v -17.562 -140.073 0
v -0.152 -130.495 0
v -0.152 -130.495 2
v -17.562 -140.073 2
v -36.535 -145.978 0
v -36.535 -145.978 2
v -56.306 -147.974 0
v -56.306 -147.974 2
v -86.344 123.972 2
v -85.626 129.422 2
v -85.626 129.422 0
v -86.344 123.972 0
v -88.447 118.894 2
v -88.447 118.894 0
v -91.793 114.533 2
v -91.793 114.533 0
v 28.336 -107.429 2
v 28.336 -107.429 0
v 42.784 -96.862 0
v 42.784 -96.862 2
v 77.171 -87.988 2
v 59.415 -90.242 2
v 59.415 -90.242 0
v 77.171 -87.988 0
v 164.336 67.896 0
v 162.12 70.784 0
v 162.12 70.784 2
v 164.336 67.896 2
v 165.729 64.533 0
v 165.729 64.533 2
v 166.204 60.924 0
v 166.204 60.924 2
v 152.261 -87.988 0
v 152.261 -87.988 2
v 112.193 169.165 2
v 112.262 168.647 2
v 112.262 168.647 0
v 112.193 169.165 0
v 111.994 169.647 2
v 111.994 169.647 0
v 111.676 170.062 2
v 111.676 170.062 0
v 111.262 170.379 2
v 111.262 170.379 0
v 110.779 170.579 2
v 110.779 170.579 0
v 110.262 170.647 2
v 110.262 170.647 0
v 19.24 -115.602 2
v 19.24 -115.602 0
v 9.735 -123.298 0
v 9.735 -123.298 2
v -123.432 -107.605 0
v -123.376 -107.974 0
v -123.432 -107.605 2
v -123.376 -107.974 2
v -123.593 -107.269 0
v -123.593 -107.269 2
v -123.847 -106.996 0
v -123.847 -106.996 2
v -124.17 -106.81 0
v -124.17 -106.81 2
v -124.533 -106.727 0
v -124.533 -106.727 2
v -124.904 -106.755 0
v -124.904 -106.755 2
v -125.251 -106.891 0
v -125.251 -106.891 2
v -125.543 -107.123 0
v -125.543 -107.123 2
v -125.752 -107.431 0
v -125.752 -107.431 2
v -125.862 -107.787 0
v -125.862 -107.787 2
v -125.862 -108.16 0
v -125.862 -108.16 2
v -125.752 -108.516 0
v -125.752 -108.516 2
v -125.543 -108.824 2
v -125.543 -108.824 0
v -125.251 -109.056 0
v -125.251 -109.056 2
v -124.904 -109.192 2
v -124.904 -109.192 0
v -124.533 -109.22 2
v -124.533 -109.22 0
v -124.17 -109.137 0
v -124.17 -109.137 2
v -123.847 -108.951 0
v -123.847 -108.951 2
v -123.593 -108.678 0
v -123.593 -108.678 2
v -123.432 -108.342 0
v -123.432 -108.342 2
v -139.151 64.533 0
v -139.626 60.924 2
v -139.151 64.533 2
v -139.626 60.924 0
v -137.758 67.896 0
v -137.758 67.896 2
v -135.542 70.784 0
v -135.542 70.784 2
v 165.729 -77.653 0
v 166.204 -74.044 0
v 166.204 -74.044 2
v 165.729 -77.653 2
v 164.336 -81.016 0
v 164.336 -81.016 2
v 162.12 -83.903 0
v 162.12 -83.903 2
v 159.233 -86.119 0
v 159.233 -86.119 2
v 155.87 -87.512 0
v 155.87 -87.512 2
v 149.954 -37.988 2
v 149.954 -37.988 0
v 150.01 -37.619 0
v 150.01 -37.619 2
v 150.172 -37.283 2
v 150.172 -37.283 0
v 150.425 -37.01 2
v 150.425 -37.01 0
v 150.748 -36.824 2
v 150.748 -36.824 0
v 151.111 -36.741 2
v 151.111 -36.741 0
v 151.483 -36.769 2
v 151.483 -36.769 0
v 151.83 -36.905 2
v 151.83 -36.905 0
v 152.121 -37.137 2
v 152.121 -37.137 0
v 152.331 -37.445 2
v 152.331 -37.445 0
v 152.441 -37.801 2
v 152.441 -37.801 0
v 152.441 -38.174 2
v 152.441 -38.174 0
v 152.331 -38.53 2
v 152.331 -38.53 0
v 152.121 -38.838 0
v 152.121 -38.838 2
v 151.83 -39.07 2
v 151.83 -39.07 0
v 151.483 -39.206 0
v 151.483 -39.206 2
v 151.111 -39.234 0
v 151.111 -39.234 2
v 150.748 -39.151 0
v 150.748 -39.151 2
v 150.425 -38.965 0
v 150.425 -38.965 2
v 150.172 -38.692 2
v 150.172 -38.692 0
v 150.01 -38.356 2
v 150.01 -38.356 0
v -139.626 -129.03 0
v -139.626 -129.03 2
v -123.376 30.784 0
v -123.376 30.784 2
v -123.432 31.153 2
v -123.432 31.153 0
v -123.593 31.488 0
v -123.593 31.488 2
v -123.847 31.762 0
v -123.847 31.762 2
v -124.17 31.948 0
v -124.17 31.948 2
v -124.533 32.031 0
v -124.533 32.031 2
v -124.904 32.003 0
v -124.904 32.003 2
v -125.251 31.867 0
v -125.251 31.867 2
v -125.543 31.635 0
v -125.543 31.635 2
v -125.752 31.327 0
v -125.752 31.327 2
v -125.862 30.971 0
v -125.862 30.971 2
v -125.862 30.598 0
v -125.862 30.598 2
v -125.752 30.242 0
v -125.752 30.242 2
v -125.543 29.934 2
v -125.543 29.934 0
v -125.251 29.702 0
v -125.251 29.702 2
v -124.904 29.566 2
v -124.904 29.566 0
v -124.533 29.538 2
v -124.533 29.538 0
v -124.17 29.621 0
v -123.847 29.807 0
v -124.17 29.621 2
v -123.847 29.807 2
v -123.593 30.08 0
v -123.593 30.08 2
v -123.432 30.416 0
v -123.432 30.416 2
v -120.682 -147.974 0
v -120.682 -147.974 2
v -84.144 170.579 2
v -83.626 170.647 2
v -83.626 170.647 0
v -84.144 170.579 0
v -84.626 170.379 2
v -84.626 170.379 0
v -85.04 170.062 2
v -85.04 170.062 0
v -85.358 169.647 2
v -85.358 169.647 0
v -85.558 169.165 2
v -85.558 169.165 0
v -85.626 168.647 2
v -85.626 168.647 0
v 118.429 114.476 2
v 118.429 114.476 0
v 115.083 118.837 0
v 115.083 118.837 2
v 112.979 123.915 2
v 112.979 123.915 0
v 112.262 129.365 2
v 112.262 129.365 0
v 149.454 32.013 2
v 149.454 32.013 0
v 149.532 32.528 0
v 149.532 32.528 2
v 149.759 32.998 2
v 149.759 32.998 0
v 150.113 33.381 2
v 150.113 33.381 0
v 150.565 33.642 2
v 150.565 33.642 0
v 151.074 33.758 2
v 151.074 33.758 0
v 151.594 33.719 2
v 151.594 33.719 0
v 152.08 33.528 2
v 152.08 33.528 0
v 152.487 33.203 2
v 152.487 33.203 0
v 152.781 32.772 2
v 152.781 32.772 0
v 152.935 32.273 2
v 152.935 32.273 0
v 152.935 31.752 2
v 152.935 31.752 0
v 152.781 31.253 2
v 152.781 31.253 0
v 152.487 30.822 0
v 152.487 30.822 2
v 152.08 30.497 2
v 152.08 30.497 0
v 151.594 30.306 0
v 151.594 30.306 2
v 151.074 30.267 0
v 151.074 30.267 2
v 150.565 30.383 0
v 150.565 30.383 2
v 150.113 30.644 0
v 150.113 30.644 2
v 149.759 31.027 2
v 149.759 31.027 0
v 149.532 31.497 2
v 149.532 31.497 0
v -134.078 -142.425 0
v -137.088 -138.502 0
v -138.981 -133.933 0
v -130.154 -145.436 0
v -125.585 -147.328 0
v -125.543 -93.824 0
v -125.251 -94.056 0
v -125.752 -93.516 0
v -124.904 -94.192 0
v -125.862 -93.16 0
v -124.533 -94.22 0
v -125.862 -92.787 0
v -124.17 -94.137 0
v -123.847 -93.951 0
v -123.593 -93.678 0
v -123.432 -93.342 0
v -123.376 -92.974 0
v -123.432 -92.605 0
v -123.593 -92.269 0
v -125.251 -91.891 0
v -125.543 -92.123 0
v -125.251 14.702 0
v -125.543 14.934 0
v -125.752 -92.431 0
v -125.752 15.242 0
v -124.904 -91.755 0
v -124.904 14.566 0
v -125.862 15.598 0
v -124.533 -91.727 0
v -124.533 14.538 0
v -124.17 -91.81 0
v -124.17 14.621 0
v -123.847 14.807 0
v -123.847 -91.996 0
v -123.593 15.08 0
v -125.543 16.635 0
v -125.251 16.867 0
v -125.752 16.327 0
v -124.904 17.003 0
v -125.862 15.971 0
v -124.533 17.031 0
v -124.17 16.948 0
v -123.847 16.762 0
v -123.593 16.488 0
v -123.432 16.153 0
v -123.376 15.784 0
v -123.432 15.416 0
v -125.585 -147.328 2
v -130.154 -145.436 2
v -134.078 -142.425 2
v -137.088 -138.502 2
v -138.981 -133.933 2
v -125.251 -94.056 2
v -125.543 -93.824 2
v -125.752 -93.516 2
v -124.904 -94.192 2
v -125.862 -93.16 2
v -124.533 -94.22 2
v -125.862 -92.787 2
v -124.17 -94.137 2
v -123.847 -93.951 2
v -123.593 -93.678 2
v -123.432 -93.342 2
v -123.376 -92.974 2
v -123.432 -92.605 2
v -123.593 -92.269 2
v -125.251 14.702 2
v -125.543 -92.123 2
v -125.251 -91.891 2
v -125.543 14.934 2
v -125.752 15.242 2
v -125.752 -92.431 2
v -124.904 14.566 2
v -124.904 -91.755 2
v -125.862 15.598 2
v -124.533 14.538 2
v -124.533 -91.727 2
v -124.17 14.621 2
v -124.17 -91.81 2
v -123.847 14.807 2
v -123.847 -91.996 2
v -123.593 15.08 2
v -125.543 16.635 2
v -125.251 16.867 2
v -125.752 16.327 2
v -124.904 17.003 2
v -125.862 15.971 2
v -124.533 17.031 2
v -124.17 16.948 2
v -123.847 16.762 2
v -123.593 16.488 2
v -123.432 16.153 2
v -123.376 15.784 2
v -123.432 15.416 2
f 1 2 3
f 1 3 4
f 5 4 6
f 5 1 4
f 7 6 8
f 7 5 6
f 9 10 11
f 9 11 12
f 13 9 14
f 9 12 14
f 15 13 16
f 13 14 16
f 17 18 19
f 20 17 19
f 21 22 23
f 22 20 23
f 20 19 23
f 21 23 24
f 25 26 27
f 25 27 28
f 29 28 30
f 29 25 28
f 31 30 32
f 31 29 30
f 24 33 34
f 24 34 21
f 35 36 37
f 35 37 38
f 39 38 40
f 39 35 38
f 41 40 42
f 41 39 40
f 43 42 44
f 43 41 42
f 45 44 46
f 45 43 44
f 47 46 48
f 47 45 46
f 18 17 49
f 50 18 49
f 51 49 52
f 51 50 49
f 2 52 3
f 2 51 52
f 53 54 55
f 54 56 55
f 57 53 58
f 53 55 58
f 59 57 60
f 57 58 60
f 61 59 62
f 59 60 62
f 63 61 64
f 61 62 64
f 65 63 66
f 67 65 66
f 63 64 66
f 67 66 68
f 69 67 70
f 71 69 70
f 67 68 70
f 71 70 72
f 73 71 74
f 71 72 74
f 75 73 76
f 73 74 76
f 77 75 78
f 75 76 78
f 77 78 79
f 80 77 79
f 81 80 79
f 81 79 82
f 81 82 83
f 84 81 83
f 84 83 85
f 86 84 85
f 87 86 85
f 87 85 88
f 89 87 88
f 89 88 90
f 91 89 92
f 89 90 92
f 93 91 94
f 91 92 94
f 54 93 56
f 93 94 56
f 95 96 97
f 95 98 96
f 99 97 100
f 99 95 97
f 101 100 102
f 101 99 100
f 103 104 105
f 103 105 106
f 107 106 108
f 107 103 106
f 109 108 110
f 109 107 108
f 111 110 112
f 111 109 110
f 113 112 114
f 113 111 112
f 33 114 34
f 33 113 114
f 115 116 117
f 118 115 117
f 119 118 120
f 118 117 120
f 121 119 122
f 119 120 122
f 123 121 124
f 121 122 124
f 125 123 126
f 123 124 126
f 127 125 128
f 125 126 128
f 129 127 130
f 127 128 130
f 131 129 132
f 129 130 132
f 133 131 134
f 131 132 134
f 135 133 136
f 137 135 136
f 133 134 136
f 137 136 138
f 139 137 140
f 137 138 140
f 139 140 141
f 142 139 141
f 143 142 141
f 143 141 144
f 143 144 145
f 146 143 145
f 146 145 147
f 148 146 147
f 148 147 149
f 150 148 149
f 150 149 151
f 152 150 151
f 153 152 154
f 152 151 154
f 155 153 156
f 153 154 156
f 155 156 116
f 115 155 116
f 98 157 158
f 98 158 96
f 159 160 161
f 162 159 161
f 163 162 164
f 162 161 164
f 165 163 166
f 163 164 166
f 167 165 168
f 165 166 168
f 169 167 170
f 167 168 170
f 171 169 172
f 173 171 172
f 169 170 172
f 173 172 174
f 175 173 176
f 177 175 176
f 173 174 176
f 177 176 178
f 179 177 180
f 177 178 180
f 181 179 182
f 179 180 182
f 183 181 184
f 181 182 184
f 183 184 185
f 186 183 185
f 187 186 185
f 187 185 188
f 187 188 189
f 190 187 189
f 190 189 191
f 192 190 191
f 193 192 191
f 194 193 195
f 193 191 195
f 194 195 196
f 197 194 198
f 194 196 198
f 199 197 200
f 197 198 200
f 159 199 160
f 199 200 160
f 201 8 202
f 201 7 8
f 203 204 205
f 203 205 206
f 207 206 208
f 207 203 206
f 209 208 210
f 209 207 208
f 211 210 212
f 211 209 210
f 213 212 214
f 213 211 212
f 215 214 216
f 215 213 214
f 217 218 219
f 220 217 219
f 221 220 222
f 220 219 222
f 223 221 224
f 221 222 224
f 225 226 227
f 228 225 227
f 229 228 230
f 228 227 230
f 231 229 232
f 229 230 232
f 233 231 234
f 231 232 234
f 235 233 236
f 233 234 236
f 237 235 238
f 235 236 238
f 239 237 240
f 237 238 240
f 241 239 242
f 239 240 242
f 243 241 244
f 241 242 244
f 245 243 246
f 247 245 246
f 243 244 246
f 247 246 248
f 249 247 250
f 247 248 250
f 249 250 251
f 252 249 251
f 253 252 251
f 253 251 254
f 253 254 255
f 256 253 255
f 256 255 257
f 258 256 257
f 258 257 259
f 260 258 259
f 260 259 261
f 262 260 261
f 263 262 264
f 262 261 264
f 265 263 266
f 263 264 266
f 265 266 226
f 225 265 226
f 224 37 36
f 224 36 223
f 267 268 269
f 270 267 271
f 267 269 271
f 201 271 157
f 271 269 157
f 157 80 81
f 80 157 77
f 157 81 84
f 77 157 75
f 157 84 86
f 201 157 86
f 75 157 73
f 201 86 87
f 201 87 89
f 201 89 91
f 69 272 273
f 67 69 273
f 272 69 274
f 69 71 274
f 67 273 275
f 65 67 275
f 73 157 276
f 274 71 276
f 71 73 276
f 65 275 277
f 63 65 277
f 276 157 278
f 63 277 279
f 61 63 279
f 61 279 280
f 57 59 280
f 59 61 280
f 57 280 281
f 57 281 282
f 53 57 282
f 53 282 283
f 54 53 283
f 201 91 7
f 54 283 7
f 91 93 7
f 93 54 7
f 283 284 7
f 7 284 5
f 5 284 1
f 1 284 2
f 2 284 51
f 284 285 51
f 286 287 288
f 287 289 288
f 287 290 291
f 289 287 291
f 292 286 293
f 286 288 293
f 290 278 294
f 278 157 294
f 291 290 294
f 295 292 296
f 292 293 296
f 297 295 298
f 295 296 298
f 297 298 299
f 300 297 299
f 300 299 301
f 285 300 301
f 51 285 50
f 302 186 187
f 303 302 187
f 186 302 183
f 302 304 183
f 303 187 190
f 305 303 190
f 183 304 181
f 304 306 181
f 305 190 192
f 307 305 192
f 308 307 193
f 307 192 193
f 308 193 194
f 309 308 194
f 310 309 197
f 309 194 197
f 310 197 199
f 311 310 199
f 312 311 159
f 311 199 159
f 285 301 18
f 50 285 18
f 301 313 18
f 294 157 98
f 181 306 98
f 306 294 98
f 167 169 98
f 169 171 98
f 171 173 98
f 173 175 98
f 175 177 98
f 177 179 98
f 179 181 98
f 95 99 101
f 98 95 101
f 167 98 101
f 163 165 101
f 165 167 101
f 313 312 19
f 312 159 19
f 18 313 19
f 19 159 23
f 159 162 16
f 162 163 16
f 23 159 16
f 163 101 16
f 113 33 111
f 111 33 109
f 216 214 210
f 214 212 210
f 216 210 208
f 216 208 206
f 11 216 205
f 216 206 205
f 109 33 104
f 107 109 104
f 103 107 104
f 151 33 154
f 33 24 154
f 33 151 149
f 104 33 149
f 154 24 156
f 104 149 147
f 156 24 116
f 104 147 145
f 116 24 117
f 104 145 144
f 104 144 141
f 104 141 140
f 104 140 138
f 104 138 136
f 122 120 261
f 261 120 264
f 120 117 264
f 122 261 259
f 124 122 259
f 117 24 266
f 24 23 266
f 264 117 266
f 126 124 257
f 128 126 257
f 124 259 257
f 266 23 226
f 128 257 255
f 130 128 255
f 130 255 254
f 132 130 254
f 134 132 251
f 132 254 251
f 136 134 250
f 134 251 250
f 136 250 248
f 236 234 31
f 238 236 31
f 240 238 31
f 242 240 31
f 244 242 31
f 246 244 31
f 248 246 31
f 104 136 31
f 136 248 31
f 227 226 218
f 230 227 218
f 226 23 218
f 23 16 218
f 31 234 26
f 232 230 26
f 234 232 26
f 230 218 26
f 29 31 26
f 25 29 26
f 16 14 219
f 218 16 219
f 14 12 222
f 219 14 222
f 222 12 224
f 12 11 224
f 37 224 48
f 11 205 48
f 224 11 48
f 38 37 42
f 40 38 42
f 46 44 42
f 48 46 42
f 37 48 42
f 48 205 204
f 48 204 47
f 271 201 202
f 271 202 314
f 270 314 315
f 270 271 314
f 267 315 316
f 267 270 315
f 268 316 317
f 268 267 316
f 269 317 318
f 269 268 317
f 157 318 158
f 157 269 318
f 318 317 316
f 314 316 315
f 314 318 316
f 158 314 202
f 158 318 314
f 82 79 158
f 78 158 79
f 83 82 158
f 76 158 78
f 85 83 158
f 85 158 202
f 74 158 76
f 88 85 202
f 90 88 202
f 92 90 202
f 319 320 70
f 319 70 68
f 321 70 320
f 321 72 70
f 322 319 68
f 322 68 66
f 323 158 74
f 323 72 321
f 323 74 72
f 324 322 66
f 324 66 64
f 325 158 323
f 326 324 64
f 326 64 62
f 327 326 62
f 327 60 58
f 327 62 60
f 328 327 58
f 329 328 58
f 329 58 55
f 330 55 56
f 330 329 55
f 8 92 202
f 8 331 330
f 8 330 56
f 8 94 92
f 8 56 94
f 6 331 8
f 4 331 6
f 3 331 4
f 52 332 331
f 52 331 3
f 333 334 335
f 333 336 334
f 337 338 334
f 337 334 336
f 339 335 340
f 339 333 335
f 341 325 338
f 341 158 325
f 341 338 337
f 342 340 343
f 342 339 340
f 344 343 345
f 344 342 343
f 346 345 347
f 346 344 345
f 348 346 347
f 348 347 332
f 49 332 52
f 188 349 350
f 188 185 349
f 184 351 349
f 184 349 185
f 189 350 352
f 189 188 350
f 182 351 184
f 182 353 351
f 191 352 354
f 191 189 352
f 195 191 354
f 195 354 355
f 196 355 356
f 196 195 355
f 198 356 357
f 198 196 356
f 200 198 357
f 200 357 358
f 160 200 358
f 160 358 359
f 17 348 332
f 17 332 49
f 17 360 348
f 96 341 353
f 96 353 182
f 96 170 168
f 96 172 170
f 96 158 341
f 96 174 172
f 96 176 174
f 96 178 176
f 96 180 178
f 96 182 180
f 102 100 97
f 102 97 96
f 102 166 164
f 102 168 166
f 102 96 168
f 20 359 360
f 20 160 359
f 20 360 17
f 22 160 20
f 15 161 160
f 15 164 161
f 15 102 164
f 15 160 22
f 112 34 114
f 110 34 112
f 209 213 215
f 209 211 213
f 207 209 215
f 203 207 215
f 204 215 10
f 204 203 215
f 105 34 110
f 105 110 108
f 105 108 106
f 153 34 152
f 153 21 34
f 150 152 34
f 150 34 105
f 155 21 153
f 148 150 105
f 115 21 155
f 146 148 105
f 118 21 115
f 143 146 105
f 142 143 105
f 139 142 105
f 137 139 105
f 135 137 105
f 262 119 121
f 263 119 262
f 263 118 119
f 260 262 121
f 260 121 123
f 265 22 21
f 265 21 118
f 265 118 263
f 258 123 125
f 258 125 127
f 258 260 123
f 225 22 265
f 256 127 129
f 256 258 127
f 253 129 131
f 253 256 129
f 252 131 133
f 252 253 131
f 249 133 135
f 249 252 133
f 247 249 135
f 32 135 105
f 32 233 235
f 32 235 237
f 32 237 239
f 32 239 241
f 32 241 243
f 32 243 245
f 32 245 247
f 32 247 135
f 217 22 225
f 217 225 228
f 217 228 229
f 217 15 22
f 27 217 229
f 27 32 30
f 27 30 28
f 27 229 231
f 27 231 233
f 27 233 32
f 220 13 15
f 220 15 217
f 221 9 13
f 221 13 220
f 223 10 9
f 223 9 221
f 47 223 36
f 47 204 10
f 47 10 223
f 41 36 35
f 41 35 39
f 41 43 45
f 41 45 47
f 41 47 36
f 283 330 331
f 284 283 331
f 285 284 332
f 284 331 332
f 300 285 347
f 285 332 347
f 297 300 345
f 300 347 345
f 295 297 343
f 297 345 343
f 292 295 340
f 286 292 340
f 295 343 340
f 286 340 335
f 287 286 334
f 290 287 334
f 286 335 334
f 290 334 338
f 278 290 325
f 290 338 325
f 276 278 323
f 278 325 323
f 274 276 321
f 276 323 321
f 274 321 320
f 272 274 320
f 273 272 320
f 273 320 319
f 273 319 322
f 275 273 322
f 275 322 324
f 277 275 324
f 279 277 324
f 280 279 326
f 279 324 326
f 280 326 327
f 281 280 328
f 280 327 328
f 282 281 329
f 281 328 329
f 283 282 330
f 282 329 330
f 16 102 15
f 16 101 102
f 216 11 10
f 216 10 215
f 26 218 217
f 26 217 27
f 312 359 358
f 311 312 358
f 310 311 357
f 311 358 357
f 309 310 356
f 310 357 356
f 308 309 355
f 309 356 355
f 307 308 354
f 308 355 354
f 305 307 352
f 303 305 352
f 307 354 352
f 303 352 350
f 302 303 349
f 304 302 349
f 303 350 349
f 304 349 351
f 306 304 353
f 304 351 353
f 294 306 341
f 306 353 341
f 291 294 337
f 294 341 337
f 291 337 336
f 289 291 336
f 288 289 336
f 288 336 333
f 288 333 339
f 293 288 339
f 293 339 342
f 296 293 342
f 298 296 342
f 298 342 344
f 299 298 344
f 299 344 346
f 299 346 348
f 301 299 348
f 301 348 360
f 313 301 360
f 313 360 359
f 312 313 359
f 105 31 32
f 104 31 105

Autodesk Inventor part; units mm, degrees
ref_plane "YZ Plane" through (0, 0, 0) normal (1, 0, 0) x (0, 1, 0)
ref_plane "XZ Plane" through (0, 0, 0) normal (0, 1, 0) x (-1, 0, 0)
ref_plane "XY Plane" through (0, 0, 0) normal (0, 0, 1) x (1, 0, 0)
sketch "Boceto1" plane through (0, 0, 0) normal (0, 0, 1) x (1, 0, 0)
  line L0 (112.2616, 170.6474) -> (112.2616, 129.3648)
  arc A0 (112.2616, 129.3648) -> (118.4288, 114.4759) centre (133.3177, 129.3648) ccw
  line L1 (118.4288, 114.4759) -> (162.1204, 70.7843)
  arc A1 (166.2045, 60.9244) -> (162.1204, 70.7843) centre (152.2606, 60.9244) ccw
  line L2 (166.2045, 60.9244) -> (166.2045, -74.0436)
  arc A2 (152.2606, -87.9875) -> (166.2045, -74.0436) centre (152.2606, -74.0436) ccw
  line L3 (152.2606, -87.9875) -> (77.1714, -87.9875)
  arc A3 (77.1714, -87.9875) -> (28.3364, -107.4286) centre (77.1714, -159.0436) ccw
  arc A4 (-0.1519, -130.4951) -> (28.3364, -107.4286) centre (-135.1799, 65.3964) ccw
  arc A5 (-56.306, -147.9736) -> (-0.1519, -130.4951) centre (-56.306, -49.0297) ccw
  line L4 (-56.306, -147.9736) -> (-120.6823, -147.9736)
  arc A6 (-139.6262, -129.0297) -> (-120.6823, -147.9736) centre (-120.6823, -129.0297) ccw
  line L5 (-139.6262, -129.0297) -> (-139.6262, 60.9244)
  arc A7 (-135.5422, 70.7843) -> (-139.6262, 60.9244) centre (-125.6823, 60.9244) ccw
  line L6 (-135.5422, 70.7843) -> (-91.7934, 114.533)
  arc A8 (-91.7934, 114.533) -> (-85.6262, 129.4219) centre (-106.6823, 129.4219) ccw
  line L7 (-85.6262, 129.4219) -> (-85.6262, 170.6474)
  line L8 (-85.6262, 170.6474) -> (112.2616, 170.6474)
extrude "Extrusión1" add sketch "Boceto1" along normal blind 2
fillet "Empalme1" radius 2 2 edges at (-85.6262, 170.6474, 1) (112.2616, 170.6474, 1)
sketch "Boceto2" plane through (0, 0, 2) normal (0, 0, 1) x (1, 0, 0)
  line L0 (-139.6262, -129.0297) -> (-139.6262, 60.9244) projected
  circle A0 centre (-124.6262, 30.7843) radius 1.25
  circle A1 centre (-124.6262, 15.7843) radius 1.25
  circle A2 centre (-124.6262, -92.9736) radius 1.25
  circle A3 centre (-124.6262, -107.9736) radius 1.25
  point P0 (-135.5422, 70.7843)
  point P1 (-120.6823, -147.9736)
  point P2 (0, 0)
  dimension "d3" = 2.5
  dimension "d4" = 2.5
  dimension "d5" = 2.5
  dimension "d6" = 2.5
  dimension "d7" = 15
  dimension "d8" = 15
  dimension "d10" = 40
  dimension "d11" = 15
  dimension "d12" = 15
  dimension "d13" = 40
extrude "Extrusión2" cut sketch "Boceto2" against normal blind 2
sketch "Boceto3" plane through (0, 0, 0) normal (0, 0, -1) x (-1, 0, 0)
  line L0 (-166.2045, 60.9244) -> (-166.2045, -74.0436) projected
  line L1 (-152.2606, -87.9875) -> (-77.1714, -87.9875) projected
  circle A0 centre (-151.2045, 32.0125) radius 1.75
  circle A1 centre (-151.2045, -37.9875) radius 1.25
  point P0 (0, 0)
  dimension "d16" = 3.5
  dimension "d17" = 2.5
  dimension "d18" = 70
  dimension "d19" = 50
  dimension "d20" = 15
extrude "Extrusión3" cut sketch "Boceto3" against normal blind 2
properties part number "porta frontal"
